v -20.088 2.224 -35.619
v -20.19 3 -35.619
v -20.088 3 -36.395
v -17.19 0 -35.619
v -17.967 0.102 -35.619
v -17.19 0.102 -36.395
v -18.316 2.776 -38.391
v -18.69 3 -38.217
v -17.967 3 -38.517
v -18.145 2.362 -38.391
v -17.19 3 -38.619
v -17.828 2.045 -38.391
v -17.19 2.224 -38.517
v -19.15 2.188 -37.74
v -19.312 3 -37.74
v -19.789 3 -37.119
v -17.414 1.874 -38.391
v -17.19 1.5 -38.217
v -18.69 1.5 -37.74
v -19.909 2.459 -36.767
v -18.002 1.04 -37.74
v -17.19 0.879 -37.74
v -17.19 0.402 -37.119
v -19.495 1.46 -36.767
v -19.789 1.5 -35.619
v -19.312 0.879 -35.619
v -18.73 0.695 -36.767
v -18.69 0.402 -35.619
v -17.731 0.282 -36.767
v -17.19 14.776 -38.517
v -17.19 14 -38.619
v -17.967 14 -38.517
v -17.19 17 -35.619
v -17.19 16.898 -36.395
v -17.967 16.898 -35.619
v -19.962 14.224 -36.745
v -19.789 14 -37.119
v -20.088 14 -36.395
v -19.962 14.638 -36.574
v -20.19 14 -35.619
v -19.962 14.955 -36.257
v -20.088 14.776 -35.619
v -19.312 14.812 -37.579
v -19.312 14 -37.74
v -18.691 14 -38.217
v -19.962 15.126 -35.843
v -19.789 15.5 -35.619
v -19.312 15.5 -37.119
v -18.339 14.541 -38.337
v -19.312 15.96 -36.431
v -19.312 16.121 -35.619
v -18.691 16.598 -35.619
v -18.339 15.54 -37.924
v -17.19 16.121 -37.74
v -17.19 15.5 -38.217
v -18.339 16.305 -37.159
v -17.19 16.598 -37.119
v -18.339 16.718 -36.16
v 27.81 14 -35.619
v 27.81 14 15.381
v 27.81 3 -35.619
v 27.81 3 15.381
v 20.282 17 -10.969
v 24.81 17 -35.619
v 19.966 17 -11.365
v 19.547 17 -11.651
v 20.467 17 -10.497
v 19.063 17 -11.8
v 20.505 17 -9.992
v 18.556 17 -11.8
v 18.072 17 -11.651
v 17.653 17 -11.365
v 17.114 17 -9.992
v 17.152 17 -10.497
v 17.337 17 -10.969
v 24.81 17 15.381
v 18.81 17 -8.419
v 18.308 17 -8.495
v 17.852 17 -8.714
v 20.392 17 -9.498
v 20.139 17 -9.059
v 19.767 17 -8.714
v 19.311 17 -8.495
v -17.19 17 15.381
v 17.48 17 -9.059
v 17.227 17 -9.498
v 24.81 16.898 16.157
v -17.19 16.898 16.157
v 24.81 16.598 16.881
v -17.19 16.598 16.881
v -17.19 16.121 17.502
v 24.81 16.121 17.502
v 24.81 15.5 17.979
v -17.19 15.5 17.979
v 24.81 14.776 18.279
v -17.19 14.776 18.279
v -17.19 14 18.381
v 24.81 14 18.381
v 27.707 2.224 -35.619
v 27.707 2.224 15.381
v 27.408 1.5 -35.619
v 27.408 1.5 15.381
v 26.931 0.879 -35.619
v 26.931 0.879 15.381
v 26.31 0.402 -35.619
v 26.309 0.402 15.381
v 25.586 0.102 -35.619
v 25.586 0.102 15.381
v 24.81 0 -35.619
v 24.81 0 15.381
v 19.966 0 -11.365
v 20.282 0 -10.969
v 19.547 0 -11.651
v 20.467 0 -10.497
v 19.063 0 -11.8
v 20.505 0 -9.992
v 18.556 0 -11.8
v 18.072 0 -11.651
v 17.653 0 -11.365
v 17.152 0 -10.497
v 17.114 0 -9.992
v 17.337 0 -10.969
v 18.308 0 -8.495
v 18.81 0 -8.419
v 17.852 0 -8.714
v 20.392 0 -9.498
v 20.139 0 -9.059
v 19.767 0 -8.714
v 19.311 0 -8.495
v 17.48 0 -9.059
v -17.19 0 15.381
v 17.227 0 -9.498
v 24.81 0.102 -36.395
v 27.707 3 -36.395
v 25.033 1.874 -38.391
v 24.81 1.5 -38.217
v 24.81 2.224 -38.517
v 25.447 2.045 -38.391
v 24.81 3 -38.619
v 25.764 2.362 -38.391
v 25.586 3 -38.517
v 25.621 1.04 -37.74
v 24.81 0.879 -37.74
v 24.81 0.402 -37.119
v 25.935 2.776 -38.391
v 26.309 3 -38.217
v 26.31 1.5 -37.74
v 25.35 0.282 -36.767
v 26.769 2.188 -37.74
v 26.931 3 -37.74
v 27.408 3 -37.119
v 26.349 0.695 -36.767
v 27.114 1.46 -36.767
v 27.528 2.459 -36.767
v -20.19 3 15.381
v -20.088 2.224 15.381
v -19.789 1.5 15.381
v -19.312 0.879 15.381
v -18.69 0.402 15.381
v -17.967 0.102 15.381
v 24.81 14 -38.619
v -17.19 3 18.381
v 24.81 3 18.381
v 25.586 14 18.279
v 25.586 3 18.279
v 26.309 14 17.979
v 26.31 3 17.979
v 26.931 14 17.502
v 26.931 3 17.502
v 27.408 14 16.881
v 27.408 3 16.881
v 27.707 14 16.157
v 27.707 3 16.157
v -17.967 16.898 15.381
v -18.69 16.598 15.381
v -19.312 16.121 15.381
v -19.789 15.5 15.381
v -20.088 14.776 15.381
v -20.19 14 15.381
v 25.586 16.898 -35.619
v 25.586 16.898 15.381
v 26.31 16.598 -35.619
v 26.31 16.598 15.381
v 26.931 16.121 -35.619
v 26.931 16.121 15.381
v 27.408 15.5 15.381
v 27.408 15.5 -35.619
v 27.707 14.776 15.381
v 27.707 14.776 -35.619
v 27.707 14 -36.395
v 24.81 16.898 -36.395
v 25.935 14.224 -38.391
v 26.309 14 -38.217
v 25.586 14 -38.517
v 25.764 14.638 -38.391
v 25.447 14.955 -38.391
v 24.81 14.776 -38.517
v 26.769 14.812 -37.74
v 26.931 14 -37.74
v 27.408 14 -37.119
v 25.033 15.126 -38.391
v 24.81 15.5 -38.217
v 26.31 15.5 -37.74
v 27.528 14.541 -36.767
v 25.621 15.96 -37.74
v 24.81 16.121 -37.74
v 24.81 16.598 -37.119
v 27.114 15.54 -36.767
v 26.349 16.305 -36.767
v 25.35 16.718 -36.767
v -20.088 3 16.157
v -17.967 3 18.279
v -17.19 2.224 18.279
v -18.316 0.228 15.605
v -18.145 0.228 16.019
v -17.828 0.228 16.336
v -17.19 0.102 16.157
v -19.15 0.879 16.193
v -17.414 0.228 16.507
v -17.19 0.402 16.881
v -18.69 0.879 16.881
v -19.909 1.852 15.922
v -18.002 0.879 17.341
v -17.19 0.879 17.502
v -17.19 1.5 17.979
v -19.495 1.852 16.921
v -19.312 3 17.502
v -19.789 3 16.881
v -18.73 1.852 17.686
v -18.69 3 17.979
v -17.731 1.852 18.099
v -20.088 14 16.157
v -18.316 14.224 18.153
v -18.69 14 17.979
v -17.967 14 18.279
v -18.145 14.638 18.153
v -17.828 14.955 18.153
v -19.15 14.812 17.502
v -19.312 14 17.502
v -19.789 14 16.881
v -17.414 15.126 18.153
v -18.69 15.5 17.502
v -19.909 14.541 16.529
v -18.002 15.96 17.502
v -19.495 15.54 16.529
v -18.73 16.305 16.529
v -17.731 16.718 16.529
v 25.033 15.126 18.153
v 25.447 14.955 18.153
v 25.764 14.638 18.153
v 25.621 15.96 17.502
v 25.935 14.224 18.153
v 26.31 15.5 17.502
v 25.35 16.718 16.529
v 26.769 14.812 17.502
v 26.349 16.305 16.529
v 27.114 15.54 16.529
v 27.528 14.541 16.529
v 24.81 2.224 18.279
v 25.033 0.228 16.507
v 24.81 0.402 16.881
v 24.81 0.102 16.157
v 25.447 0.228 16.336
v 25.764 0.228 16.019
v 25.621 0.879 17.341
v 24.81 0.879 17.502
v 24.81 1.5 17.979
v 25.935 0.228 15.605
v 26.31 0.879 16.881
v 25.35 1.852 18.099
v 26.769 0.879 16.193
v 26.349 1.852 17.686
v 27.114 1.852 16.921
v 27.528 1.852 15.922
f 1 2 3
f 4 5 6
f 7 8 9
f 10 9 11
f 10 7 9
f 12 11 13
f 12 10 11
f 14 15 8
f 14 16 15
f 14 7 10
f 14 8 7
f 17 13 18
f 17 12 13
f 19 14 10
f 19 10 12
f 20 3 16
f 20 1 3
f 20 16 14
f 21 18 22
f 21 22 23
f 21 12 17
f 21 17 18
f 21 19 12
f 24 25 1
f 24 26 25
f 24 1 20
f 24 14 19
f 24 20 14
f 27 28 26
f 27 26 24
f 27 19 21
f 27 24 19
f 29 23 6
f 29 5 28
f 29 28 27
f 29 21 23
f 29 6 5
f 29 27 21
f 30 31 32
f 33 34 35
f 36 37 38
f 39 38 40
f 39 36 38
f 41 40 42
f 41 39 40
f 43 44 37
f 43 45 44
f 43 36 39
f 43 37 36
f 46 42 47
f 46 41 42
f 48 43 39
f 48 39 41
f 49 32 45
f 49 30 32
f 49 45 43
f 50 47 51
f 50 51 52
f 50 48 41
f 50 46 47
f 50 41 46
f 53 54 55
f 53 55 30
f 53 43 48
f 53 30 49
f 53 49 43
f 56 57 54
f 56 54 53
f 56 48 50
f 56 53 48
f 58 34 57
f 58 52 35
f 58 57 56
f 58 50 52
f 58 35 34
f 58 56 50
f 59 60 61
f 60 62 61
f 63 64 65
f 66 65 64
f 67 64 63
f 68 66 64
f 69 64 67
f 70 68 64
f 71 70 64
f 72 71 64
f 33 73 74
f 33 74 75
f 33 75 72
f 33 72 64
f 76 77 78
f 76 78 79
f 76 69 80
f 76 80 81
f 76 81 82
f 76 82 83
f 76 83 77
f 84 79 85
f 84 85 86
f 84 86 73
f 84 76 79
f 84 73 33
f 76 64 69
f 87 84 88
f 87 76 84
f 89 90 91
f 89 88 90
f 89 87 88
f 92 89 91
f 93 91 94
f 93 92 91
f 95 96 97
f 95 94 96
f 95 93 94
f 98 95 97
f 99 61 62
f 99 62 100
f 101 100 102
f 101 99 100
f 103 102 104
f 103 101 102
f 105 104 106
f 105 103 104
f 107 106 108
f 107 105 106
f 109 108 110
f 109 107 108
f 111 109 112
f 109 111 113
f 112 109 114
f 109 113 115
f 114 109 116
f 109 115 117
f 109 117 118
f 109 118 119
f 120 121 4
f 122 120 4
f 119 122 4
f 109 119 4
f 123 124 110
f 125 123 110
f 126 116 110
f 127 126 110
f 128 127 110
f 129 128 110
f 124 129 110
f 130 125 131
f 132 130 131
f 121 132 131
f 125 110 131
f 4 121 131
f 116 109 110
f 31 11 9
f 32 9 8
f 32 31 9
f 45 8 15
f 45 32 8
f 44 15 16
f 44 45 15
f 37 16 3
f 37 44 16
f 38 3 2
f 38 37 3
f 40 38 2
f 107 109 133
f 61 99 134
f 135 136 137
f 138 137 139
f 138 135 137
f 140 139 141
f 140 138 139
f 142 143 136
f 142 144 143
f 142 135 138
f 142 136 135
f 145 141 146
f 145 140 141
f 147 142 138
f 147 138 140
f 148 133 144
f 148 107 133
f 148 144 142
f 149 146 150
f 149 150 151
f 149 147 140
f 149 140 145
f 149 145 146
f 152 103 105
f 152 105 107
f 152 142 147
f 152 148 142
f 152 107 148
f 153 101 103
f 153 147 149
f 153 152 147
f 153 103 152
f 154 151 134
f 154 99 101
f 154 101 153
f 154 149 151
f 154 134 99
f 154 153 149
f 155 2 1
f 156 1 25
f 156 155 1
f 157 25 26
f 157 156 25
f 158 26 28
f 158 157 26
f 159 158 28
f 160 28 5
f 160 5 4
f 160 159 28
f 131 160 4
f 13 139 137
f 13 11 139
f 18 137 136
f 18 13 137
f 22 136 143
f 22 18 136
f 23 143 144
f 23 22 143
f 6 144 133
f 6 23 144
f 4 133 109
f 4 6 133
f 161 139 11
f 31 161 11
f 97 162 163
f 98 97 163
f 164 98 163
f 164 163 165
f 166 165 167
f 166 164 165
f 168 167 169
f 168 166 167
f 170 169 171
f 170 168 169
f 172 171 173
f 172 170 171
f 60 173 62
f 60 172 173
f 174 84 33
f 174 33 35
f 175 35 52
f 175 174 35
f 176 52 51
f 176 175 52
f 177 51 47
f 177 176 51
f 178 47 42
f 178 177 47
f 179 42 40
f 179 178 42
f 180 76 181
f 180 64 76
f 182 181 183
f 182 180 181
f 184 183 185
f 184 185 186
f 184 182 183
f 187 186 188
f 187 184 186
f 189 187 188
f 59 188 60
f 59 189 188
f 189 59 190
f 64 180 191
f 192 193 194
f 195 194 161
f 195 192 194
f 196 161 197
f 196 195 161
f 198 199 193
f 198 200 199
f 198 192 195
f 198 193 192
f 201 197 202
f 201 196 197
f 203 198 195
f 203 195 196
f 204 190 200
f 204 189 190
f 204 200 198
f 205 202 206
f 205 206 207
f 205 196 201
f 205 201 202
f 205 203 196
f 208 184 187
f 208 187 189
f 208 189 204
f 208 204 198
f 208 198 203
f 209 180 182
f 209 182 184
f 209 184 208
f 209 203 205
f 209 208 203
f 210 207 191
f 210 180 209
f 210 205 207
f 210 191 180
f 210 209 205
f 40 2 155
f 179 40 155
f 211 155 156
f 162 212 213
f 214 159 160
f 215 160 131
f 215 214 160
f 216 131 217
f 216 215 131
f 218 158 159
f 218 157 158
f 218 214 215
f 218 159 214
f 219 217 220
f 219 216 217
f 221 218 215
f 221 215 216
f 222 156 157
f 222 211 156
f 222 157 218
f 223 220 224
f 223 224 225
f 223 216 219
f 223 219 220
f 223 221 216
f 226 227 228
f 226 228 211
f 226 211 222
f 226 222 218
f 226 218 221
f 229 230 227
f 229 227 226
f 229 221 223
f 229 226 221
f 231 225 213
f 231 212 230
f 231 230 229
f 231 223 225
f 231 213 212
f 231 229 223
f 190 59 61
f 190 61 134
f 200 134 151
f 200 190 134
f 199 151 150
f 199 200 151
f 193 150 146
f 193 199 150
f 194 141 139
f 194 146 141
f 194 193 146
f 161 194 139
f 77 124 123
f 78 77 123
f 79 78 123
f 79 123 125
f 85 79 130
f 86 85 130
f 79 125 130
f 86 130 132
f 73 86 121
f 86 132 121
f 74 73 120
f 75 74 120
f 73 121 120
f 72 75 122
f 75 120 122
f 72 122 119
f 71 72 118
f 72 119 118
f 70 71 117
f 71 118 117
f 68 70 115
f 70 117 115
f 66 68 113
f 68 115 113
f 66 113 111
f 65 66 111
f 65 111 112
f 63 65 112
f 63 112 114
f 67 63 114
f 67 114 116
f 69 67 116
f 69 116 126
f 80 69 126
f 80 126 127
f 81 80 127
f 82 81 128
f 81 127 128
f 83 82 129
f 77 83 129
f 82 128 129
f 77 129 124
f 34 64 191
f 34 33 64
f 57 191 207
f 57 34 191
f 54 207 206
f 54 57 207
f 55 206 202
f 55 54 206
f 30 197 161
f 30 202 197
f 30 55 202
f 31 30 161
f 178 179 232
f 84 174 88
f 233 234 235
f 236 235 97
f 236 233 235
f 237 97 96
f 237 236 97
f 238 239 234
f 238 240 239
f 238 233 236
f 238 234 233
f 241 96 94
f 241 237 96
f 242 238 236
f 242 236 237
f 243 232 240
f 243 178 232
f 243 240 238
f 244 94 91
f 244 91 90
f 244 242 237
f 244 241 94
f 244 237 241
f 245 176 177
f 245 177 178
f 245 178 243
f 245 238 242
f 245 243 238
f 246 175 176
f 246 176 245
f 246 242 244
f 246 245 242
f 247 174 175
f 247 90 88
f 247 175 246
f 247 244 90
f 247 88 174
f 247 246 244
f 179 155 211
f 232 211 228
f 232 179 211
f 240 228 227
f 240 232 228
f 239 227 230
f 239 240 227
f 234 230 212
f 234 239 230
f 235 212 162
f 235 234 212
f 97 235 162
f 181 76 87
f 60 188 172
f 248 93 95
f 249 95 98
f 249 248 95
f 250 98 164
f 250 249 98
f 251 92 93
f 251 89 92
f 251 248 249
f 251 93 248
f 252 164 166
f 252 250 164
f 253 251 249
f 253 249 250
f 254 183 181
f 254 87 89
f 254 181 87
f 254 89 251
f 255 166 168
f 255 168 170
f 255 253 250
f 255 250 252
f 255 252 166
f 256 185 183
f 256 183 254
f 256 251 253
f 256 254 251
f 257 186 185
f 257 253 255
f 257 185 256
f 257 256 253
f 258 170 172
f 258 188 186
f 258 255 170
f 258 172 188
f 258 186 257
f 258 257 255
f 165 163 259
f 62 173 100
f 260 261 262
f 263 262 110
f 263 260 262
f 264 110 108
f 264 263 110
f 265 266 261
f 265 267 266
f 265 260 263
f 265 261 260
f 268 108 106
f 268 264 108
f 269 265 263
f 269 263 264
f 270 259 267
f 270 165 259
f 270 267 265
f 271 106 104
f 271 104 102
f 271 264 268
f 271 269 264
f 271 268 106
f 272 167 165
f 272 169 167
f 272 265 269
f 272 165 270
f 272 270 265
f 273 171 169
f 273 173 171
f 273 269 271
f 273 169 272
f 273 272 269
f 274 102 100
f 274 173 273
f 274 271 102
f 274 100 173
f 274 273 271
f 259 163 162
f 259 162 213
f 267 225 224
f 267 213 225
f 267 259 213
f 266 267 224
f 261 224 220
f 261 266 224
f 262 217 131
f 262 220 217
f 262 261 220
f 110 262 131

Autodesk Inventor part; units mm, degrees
ref_plane "YZ Plane" through (0, 0, 0) normal (1, 0, 0) x (0, 1, 0)
ref_plane "XZ Plane" through (0, 0, 0) normal (0, 1, 0) x (-1, 0, 0)
ref_plane "XY Plane" through (0, 0, 0) normal (0, 0, 1) x (1, 0, 0)
sketch "スケッチ1" plane through (0, 0, 0) normal (0, 1, 0) x (-1, 0, 0)
  line L0 (20.1905, 18.381) -> (-27.8095, 18.381)
  line L1 (-27.8095, 18.381) -> (-27.8095, -38.619)
  line L2 (-27.8095, -38.619) -> (20.1905, -38.619)
  line L3 (20.1905, -38.619) -> (20.1905, 18.381)
  point P0 (0, 0)
  dimension "d0" = 48
  dimension "d1" = 57
extrude "押し出し1" add sketch "スケッチ1" along normal blind 17
fillet "フィレット1" radius 3 12 edges at (27.8095, 17, -10.119) (3.8095, 17, -38.619) (-20.1905, 17, -10.119) (3.8095, 17, 18.381) (-20.1905, 8.5, 18.381) (27.8095, 8.5, 18.381) (3.8095, 0, 18.381) (27.8095, 0, -10.119) (-20.1905, 0, -10.119) (-20.1905, 8.5, -38.619) (27.8095, 8.5, -38.619) (3.8095, 0, -38.619)
sketch "スケッチ2" plane through (0, 17, 0) normal (0, 1, 0) x (1, 0, 0)
  line L0 (18.8095, 10.119) -> (18.8095, 38.619) construction
  line L1 (-17.1905, 38.619) -> (24.8095, 38.619) construction
  line L2 (18.8095, 10.119) -> (18.8095, -18.381) construction
  line L3 (24.8095, -18.381) -> (-17.1905, -18.381) construction
  line L4 (27.8095, -15.381) -> (27.8095, 35.619) construction
  point P0 (0, 0)
  dimension "d5" = 9
hole "穴1" at (18.8095, 17, -10.119) direction (0, -1, 0) diameter 3.4 depth 17 clearance for "Countersunk Flat Head Screw ISO 2009/7046" size "M3" standard "ISO"
properties part number "batterybox" material "ABS プラスチック"
